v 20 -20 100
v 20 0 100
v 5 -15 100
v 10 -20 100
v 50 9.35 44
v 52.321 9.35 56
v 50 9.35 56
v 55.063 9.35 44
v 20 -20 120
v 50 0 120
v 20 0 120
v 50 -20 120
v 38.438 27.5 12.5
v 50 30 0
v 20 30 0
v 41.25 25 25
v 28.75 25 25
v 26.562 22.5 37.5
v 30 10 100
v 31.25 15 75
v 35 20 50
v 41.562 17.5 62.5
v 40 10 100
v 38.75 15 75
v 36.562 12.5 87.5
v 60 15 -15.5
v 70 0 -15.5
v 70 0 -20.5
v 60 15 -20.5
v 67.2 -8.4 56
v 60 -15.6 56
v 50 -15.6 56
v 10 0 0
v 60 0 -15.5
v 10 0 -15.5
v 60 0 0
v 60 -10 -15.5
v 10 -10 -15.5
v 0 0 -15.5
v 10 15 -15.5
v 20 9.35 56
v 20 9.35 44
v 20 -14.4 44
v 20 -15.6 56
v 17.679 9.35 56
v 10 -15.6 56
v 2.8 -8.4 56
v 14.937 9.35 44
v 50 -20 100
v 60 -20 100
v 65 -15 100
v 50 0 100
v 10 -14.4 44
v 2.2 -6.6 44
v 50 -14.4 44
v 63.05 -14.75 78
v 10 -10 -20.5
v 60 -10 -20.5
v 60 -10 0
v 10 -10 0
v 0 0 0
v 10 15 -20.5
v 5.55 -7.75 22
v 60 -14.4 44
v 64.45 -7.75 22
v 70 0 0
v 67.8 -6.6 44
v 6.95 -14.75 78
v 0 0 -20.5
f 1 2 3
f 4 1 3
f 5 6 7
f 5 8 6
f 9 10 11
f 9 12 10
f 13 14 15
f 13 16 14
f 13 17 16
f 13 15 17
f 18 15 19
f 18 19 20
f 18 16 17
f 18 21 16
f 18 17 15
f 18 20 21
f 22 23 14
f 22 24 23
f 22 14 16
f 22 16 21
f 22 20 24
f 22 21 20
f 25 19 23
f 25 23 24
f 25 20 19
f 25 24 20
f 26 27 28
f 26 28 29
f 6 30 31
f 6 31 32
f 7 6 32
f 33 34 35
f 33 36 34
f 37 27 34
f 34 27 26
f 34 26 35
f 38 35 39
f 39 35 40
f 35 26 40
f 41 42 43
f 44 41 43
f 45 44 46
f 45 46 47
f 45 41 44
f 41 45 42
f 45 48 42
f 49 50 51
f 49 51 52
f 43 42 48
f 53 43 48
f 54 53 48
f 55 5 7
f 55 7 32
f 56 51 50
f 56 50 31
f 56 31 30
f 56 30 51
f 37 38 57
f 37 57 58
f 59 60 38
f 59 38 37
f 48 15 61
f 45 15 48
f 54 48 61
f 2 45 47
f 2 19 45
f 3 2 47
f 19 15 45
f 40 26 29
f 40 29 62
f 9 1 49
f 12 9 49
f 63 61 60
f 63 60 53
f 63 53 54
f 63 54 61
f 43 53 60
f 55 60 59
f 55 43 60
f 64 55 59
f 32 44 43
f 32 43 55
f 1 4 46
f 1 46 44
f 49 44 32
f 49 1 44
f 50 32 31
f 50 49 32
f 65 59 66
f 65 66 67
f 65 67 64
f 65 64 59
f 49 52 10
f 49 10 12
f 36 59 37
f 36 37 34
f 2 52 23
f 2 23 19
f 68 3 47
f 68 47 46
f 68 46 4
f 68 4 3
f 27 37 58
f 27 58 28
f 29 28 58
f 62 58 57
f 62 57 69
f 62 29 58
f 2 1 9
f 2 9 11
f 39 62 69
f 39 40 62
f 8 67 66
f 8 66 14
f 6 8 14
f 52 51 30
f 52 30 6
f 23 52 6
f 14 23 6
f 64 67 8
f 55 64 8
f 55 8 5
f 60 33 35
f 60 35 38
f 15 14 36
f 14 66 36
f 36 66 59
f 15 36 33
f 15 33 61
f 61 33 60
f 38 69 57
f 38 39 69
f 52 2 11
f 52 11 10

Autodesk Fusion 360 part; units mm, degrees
sketch "Sketch1" plane through (0, 0, 0) normal (0, 0, 1) x (1, 0, 0)
  line L0 (50, 30) -> (20, 30)
  line L1 (0, 0) -> (20, 30)
  line L2 (50, 30) -> (70, 0)
  line L3 (0, 0) -> (10, -10)
  line L4 (10, -10) -> (60, -10)
  line L5 (60, -10) -> (70, 0)
ref_plane "WorkPlane1" through (0, 0, 100) normal (0, 0, 1) x (1, 0, 0)
sketch "Sketch2" plane through (0, 0, 100) normal (0, 0, 1) x (1, 0, 0)
  line L0 (30, 10) -> (40, 10)
  line L1 (60, -20) -> (10, -20)
  line L2 (30, 10) -> (5, -15)
  line L3 (5, -15) -> (10, -20)
  line L4 (40, 10) -> (65, -15)
  line L5 (65, -15) -> (60, -20)
loft "Loft1" add profiles "Sketch1", "Sketch2" section 1 section 2 makes body 1
ref_plane "WorkPlane2" through (35, 10, 50) normal (0, 0, -1) x (-1, 0, 0)
sketch "Sketch3" plane through (0, 0, 50) normal (0, 0, -1) x (-1, 0, 0)
  line L0 (0.4452, 9.35) -> (-20, 9.35)
  line L1 (-20, 9.35) -> (-20, -30.9261)
  line L2 (-20, -30.9261) -> (0.4452, -30.9261)
  line L3 (0.4452, -30.9261) -> (0.4452, 9.35)
  line L4 (-69.0117, 9.35) -> (-50, 9.35)
  line L5 (-50, 9.35) -> (-50, -30.2583)
  line L6 (-50, -30.2583) -> (-69.0117, -30.2583)
  line L7 (-69.0117, -30.2583) -> (-69.0117, 9.35)
extrude "Extrude1" cut sketch "Sketch3" along normal blind -6 and the other way blind -6 bodies 1
ref_plane "WorkPlane3" through (35, 10, -15.5) normal (0, 0, -1) x (-1, 0, 0)
sketch "Sketch4" plane through (0, 0, -15.5) normal (0, 0, -1) x (-1, 0, 0)
  line L0 (-70, 0) -> (-60, 15)
  line L1 (0, 0) -> (-10, -10)
  line L2 (-10, -10) -> (-60, -10)
  line L3 (-60, -10) -> (-70, 0)
  line L4 (-10, 15) -> (0, 0)
  line L5 (-60, 15) -> (-10, 15)
extrude "Extrude2" add sketch "Sketch4" along normal blind 5 separate body makes body 2
sketch "Sketch5" plane through (0, 0, 0) normal (0, 0, -1) x (1, 0, 0)
  line L0 (10, 10) -> (0, 0)
  line L1 (0, 0) -> (20, -30)
  line L2 (20, -30) -> (50, -30)
  line L3 (50, -30) -> (70, 0)
  line L4 (70, 0) -> (60, 10)
  line L5 (60, 10) -> (10, 10)
  line L6 (10, 10) -> (60, 10)
  line L7 (60, 10) -> (60, 0)
  line L8 (60, 0) -> (10, 0)
  line L9 (10, 0) -> (10, 10)
extrude "Extrude3" add sketch "Sketch5" along normal blind 20 contours L5 L6 L7 L8 L9 bodies 1 2
sketch "Sketch6" plane through (0, 0, 100) normal (0, 0, 1) x (-1, 0, 0)
  line L0 (-5, 15) -> (-10, 20)
  line L1 (-10, 20) -> (-60, 20)
  line L2 (-60, 20) -> (-65, 15)
  line L3 (-65, 15) -> (-40, -10)
  line L4 (-40, -10) -> (-30, -10)
  line L5 (-30, -10) -> (-5, 15)
  line L6 (-20, 0) -> (-50, 0)
  line L7 (-50, 0) -> (-50, 20)
  line L8 (-50, 20) -> (-20, 20)
  line L9 (-20, 20) -> (-20, 0)
extrude "Extrude4" add sketch "Sketch6" along normal blind 20 contours L1 L6 L7 L8 L9 bodies 1
